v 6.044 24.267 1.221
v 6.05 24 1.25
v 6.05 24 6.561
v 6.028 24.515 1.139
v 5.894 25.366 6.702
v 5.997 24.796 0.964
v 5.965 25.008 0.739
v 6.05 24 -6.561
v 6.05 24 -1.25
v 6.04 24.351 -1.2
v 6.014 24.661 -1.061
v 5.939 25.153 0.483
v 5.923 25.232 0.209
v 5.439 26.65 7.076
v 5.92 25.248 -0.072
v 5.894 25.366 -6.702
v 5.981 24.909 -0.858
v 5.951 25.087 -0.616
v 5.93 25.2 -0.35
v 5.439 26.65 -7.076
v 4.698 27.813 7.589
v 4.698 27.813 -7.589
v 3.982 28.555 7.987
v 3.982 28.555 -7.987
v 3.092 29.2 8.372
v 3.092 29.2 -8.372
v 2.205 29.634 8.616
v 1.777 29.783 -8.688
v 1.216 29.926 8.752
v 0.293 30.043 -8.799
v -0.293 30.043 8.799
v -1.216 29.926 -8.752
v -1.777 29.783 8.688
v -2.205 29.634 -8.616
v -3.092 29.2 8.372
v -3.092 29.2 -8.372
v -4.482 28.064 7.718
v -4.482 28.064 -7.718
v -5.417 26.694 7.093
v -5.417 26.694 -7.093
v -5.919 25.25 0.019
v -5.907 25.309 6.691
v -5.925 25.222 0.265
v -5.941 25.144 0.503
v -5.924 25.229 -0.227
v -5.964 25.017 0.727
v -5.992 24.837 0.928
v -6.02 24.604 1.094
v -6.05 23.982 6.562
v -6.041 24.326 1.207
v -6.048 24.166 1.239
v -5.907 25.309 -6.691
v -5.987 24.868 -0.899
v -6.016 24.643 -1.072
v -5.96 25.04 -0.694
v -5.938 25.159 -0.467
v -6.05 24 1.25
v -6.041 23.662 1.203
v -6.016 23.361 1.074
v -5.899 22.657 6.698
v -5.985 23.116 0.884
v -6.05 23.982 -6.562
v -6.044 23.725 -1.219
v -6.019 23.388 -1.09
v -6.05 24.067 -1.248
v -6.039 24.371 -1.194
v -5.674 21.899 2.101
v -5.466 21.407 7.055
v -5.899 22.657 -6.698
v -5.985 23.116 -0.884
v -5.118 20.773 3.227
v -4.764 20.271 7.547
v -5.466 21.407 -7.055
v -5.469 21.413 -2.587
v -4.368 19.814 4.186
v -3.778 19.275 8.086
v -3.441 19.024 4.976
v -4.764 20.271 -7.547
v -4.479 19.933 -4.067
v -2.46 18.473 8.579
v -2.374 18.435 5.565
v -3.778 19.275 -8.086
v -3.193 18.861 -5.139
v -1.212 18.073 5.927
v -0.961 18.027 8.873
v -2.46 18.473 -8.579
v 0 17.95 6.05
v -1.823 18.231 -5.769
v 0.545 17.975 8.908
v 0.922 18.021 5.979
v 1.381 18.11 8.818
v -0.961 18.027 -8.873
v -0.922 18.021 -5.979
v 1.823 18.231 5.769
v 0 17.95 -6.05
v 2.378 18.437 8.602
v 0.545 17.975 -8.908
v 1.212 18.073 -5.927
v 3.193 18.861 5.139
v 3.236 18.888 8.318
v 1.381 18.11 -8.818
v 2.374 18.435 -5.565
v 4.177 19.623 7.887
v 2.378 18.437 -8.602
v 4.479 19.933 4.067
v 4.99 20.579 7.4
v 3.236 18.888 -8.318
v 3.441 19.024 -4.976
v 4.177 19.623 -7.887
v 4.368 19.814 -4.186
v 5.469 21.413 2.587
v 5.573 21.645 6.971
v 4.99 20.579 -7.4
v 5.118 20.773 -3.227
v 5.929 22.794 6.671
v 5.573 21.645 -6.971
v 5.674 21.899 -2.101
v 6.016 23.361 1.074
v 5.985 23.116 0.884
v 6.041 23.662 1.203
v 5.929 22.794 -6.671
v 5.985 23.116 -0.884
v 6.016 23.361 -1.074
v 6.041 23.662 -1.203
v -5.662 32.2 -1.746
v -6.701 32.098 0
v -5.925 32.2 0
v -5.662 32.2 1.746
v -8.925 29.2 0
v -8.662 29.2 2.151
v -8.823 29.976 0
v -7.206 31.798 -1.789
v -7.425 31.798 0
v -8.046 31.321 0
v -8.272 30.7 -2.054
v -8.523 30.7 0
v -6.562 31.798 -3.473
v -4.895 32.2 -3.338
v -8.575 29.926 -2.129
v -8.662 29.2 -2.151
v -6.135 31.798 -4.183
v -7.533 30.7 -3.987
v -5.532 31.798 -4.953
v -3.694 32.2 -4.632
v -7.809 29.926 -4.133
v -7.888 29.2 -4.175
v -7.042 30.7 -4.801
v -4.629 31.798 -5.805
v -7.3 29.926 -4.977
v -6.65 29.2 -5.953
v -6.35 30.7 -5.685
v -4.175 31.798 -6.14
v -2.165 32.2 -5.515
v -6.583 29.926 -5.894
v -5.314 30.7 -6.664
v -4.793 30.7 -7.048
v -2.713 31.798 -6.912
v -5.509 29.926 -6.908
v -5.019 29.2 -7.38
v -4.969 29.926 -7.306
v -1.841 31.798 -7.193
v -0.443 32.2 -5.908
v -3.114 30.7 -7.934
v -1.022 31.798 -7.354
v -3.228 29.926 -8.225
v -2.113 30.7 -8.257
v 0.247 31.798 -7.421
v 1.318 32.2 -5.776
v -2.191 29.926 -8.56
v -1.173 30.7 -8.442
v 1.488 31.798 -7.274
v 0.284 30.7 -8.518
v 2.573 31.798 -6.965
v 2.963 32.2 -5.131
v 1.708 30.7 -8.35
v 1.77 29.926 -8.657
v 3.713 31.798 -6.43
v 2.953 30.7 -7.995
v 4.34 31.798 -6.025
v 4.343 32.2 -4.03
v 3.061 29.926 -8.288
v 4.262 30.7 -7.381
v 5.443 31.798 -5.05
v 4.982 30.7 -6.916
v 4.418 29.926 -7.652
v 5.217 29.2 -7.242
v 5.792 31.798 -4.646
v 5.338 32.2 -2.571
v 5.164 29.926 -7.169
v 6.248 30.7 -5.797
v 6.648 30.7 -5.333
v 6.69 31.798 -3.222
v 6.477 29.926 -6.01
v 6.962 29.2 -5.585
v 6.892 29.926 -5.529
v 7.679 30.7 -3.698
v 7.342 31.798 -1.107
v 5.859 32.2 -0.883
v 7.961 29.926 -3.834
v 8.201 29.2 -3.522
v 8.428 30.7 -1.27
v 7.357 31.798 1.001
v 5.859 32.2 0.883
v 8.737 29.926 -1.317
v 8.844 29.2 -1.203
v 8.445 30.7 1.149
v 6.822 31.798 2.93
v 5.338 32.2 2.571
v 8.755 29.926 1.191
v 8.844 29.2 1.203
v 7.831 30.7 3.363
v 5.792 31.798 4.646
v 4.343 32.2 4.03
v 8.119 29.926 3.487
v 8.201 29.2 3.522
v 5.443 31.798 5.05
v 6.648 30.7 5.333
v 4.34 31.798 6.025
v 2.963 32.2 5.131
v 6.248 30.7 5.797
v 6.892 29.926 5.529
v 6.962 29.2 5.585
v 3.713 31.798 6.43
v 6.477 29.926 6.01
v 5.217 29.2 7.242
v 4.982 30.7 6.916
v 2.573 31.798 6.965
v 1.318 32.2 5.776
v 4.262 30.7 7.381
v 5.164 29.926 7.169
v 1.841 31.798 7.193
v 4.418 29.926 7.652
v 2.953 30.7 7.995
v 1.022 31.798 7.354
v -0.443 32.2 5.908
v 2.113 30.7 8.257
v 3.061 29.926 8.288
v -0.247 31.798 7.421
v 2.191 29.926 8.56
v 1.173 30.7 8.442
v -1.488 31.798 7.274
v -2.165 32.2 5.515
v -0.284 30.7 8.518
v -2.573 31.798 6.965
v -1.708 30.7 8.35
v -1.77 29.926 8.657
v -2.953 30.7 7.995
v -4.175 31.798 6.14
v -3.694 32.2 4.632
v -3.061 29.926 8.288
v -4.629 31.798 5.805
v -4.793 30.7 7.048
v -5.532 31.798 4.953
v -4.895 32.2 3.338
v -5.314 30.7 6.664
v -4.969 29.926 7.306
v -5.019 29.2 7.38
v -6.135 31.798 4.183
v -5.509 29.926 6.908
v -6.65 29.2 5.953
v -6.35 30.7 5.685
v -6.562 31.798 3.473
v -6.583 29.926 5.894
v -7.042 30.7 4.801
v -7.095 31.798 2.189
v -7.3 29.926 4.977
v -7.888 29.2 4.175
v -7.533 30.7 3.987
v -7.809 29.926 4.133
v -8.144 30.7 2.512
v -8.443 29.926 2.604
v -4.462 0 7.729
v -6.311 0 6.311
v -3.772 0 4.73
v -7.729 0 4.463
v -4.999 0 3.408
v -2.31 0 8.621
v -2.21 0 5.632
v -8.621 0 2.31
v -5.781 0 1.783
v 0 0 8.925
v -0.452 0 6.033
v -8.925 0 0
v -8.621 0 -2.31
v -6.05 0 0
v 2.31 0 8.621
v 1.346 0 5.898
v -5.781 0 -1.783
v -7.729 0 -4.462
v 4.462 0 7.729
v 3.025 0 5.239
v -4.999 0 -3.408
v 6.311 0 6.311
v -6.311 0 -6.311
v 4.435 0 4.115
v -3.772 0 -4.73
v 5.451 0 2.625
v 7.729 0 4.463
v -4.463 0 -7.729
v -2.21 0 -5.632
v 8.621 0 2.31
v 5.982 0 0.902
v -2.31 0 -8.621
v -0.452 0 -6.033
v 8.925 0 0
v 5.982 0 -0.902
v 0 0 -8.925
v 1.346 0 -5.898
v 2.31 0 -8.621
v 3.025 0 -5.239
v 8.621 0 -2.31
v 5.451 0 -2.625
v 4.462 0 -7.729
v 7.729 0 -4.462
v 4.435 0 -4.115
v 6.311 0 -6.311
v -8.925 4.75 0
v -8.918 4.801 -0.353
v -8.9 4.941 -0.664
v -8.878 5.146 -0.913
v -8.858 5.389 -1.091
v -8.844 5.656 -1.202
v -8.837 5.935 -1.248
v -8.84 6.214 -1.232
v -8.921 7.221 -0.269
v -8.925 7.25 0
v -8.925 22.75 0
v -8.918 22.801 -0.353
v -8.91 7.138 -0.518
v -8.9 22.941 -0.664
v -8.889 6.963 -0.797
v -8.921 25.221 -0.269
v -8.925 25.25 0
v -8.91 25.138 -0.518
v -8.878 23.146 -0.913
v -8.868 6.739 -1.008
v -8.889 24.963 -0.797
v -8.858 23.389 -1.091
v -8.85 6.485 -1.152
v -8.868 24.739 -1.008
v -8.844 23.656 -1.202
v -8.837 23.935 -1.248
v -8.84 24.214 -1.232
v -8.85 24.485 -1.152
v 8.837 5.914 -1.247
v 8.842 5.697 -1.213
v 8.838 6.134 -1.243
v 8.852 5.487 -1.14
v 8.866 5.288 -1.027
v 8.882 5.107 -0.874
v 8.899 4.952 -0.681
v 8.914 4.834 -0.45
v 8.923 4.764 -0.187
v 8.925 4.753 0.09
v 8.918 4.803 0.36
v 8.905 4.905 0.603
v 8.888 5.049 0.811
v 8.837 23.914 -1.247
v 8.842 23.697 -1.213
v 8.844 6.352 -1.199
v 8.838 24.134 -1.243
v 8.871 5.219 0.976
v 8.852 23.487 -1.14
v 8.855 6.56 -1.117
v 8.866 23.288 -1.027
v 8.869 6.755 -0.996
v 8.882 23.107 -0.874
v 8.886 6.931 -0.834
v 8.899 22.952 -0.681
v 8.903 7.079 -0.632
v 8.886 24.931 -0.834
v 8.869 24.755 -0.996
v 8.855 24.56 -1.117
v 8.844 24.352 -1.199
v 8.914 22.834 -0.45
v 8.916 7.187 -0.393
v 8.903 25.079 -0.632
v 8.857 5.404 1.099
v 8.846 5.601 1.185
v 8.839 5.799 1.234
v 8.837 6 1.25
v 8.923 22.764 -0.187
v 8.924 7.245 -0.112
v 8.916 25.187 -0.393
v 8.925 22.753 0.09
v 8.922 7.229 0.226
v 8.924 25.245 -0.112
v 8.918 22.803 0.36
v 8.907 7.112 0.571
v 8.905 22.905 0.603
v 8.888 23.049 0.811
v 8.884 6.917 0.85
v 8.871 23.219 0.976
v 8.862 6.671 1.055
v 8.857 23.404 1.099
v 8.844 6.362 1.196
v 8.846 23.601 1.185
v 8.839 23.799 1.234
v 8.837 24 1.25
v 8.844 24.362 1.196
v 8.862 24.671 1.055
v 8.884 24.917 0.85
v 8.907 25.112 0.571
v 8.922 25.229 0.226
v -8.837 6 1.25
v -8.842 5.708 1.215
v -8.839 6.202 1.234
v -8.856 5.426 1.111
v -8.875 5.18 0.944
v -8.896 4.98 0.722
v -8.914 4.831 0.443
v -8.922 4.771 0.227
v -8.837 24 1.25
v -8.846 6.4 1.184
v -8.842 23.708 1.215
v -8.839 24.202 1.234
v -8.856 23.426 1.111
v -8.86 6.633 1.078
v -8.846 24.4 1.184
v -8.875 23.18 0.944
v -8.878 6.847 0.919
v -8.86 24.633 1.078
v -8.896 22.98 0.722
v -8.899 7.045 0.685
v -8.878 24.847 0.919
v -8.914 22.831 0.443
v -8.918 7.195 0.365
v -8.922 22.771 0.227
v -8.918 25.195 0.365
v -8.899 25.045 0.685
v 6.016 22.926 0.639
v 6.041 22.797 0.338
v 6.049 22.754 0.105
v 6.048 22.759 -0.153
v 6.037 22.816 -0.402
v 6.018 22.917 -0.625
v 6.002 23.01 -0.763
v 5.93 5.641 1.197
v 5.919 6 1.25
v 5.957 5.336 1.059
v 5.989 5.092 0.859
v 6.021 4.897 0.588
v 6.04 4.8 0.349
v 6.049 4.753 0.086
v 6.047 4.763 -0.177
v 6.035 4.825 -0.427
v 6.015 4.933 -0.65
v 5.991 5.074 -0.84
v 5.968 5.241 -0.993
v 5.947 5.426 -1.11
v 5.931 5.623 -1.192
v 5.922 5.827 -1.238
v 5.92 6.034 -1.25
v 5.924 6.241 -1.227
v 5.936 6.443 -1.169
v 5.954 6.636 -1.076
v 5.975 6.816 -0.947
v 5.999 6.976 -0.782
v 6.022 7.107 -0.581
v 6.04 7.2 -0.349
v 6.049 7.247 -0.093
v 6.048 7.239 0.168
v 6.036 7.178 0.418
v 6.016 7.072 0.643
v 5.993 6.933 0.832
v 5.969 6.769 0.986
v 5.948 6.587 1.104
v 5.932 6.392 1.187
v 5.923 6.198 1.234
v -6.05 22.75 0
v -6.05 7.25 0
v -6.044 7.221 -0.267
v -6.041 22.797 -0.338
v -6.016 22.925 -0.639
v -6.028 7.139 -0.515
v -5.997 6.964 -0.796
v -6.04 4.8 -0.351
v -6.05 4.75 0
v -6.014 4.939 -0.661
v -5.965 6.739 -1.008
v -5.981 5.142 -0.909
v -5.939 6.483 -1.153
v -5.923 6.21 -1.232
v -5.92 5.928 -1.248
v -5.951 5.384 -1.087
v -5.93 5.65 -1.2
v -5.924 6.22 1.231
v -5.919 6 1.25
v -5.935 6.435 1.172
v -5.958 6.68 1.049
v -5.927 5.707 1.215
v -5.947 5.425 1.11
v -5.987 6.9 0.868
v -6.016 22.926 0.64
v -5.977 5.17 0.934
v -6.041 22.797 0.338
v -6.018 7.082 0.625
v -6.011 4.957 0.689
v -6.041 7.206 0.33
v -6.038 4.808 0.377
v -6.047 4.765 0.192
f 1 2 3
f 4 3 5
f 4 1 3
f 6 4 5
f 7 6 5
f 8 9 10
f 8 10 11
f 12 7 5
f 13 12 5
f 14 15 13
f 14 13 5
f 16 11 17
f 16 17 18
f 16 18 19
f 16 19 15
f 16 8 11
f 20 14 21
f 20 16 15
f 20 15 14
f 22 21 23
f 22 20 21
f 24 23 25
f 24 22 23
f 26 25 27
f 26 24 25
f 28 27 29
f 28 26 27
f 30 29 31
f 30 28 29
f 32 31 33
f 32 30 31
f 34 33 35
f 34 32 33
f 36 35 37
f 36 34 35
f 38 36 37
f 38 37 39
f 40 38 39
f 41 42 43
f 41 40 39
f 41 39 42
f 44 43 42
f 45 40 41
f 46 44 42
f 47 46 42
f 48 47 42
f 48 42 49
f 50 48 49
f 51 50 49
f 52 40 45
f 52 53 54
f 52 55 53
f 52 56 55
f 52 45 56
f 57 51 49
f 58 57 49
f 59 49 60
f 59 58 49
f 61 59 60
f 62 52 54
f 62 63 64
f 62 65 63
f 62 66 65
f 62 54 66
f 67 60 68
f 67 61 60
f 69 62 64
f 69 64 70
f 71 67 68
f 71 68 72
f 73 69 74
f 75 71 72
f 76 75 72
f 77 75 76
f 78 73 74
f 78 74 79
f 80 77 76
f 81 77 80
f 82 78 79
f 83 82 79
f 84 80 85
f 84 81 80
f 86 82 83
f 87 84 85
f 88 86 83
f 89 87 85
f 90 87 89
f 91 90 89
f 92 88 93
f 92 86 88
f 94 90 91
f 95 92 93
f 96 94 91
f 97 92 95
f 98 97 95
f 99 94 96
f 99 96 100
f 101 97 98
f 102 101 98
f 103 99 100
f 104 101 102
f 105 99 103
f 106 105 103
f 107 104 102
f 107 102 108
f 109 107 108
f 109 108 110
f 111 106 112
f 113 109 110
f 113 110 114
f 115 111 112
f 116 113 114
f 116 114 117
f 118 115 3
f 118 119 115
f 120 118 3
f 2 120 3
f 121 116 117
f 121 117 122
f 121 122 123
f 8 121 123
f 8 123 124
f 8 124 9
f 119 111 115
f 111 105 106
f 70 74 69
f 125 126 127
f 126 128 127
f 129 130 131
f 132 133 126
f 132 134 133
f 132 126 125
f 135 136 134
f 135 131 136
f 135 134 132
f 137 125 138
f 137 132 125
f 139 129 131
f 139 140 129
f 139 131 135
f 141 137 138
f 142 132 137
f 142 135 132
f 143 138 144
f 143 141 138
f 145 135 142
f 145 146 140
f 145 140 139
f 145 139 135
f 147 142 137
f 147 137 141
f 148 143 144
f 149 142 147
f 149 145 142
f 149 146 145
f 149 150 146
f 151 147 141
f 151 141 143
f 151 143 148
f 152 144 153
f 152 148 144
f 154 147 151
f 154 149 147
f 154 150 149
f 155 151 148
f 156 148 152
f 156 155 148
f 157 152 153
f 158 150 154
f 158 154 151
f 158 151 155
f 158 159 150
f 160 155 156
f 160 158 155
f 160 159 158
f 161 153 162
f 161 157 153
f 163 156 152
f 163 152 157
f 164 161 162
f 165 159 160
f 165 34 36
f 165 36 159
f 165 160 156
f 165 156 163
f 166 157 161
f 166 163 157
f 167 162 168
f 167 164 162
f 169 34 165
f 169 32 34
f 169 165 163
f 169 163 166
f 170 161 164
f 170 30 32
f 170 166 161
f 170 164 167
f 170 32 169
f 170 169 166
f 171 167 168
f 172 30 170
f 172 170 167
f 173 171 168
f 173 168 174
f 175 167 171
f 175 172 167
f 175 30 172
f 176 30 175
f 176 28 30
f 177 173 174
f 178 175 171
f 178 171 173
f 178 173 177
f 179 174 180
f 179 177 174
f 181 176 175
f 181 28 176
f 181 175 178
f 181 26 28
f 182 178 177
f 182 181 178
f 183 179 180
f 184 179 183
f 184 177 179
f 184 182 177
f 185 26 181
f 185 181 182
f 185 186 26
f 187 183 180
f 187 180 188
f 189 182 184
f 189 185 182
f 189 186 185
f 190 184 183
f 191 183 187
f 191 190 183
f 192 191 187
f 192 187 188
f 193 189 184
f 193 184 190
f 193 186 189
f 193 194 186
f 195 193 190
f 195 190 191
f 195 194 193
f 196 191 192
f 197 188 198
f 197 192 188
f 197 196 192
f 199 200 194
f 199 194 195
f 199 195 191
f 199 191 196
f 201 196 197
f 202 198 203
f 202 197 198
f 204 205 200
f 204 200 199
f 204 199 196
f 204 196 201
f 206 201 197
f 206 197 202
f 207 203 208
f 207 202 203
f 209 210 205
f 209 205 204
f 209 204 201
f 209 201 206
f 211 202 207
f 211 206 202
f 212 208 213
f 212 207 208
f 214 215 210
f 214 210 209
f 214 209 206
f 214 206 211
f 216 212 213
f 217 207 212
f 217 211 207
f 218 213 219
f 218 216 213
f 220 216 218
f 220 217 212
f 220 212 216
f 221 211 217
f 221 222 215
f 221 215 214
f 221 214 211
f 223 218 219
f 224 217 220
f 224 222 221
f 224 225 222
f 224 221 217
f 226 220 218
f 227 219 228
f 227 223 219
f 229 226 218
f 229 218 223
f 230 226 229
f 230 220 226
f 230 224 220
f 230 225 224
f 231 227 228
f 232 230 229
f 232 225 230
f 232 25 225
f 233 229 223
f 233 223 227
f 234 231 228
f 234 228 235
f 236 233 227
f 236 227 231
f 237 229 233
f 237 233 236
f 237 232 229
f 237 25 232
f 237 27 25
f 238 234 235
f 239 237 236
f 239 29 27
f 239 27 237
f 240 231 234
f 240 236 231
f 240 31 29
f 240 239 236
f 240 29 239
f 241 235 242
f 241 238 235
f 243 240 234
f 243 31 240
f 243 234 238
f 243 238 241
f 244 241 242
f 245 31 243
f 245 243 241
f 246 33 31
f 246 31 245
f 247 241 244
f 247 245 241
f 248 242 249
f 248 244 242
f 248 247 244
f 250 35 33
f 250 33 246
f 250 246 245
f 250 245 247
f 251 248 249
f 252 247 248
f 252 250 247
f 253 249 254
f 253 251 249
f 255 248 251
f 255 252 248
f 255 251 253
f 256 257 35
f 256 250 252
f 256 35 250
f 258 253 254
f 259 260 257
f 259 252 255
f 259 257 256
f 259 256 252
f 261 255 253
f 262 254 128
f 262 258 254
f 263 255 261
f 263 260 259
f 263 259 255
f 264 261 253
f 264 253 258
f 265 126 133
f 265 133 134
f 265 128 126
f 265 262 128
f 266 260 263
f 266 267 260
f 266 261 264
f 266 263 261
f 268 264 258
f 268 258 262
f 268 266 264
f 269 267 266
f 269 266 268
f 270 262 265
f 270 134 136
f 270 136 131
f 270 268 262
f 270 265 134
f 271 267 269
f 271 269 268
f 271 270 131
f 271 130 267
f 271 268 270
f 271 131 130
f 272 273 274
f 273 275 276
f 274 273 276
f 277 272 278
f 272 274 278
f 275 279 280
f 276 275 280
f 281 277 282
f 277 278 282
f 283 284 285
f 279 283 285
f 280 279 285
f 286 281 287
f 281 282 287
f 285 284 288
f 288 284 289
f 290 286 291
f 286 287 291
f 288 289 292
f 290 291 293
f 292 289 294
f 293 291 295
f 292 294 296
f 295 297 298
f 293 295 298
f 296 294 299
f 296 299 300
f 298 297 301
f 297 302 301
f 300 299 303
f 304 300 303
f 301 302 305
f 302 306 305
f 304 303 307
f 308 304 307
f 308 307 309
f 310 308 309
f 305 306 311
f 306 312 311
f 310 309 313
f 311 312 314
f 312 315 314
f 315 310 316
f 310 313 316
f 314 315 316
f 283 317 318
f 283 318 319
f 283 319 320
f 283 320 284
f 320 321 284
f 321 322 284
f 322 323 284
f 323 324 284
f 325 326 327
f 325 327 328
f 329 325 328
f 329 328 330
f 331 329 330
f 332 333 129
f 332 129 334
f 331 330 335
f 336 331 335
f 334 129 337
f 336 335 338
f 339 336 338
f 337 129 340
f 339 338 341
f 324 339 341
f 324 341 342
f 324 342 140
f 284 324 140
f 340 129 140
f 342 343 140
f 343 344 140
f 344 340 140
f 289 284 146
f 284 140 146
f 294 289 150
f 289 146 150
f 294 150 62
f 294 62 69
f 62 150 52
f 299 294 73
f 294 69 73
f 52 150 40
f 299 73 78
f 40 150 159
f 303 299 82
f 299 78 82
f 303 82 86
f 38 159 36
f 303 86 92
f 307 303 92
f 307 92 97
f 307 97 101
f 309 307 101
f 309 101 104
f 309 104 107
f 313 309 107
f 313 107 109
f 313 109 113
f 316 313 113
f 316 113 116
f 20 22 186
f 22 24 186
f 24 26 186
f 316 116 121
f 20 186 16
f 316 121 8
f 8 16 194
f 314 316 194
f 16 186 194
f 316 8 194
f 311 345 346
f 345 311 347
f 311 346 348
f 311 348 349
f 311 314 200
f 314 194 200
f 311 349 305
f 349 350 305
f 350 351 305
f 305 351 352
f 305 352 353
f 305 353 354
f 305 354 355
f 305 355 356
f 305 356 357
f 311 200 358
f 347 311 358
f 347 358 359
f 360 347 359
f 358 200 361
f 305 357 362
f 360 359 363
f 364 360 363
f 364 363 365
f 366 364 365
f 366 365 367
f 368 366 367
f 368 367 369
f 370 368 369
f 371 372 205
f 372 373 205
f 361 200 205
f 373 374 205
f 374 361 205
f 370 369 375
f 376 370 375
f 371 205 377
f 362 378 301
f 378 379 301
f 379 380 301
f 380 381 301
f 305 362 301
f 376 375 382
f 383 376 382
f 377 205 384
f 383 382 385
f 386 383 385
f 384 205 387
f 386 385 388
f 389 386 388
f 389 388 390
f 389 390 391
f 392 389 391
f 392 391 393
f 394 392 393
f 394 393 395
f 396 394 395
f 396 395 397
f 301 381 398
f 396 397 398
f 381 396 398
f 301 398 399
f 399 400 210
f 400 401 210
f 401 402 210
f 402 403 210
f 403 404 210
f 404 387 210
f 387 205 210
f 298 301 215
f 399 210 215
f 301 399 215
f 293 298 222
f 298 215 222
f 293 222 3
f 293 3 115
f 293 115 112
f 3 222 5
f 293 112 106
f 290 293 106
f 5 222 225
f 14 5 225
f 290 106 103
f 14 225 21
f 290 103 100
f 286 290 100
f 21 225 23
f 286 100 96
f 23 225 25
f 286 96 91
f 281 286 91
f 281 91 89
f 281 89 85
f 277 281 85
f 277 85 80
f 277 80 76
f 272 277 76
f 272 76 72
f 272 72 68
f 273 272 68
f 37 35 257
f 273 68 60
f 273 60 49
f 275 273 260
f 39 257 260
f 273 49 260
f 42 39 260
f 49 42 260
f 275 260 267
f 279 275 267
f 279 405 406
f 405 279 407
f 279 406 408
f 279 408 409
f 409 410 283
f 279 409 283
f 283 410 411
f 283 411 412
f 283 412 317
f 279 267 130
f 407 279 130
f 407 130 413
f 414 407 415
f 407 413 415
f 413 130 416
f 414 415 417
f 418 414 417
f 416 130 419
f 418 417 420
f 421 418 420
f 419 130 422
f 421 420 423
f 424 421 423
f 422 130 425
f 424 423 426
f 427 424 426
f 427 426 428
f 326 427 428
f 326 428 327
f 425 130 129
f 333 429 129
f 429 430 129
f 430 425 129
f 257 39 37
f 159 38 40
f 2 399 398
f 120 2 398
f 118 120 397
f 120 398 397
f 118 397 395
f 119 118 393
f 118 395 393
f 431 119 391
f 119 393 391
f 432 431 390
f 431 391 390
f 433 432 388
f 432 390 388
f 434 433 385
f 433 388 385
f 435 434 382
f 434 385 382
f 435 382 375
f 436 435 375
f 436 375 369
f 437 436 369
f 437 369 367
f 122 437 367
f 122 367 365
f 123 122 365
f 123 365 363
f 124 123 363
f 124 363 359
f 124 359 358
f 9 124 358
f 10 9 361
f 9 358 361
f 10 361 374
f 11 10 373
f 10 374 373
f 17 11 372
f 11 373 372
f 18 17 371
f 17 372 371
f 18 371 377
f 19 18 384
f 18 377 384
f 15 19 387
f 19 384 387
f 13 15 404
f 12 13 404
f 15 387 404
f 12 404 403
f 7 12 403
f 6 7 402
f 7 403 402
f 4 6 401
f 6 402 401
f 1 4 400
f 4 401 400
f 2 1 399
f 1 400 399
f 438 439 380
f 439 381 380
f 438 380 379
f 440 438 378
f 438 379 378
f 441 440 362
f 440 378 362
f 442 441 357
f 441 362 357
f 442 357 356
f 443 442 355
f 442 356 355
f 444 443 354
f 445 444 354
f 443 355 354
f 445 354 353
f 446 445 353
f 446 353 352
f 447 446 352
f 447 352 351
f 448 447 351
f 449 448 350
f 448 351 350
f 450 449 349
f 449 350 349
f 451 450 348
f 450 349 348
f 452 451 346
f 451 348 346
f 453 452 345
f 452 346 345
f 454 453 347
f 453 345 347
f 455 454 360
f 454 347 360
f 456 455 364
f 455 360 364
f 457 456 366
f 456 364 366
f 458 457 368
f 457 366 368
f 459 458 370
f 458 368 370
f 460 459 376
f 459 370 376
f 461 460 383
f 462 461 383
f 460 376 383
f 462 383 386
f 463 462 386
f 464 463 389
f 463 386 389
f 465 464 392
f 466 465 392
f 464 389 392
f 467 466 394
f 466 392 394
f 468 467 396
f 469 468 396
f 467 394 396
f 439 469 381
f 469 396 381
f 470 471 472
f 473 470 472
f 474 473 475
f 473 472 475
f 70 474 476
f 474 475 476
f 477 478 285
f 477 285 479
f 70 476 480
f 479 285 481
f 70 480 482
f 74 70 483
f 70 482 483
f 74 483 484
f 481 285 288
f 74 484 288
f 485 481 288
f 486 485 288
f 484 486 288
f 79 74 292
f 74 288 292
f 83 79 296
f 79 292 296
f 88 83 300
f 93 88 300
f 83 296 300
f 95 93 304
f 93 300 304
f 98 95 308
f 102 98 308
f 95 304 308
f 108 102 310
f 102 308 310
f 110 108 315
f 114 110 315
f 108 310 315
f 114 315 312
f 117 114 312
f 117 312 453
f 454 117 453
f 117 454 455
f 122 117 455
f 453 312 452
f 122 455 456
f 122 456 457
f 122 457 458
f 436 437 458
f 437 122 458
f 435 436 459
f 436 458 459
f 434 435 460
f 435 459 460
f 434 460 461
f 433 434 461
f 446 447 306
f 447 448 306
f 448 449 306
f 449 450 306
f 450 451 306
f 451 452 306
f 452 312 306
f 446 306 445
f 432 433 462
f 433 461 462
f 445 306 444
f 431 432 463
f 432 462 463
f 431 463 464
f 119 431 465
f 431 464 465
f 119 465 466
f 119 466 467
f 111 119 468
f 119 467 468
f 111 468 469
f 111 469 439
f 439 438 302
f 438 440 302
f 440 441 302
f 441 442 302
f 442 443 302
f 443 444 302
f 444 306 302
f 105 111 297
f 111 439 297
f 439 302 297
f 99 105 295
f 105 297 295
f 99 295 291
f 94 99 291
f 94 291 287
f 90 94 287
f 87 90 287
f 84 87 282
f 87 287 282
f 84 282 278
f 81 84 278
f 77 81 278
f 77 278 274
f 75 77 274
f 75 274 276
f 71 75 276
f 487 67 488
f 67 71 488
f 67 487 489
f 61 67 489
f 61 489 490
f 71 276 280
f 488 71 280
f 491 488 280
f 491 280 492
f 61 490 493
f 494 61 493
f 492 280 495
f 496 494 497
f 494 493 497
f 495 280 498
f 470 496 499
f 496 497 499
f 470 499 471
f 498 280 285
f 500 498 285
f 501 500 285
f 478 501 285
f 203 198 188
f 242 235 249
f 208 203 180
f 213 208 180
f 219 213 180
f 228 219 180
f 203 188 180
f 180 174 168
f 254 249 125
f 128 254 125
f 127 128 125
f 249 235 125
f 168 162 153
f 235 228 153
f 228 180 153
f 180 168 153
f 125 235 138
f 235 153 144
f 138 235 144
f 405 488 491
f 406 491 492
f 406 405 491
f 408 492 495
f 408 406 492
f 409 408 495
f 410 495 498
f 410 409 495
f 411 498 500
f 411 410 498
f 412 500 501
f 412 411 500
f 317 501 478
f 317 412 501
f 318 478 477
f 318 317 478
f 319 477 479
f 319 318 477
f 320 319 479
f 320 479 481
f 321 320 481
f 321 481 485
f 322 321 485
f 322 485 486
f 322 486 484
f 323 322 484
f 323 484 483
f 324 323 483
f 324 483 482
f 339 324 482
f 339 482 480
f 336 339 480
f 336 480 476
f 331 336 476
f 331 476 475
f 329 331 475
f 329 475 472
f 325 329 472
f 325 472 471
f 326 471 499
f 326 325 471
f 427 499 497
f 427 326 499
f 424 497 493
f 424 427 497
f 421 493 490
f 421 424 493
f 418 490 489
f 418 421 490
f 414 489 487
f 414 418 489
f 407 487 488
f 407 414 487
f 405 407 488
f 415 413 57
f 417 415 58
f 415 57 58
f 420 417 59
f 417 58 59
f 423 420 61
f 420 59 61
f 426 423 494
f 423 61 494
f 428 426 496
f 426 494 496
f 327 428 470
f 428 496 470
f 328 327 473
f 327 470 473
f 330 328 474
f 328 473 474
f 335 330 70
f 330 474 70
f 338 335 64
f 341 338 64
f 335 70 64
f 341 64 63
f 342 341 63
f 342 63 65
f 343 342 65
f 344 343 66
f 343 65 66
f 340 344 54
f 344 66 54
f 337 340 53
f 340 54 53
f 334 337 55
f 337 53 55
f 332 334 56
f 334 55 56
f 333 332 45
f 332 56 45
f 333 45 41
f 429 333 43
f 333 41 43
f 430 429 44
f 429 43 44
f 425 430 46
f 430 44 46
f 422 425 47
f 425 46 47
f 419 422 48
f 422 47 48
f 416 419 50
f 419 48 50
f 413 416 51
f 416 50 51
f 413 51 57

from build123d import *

# Parameters (mm, degrees)
CUT_EXTRUDE_1_DEPTH         = 35.585419616
CUT_EXTRUDE_1_DEPTH_BACK    = 35.585419616
SKETCH_2_R                  = 6.05
SKETCH_4_W                  = 1.25
SKETCH_4_H                  = 8.925
HOLE_WIZARD_M3_1_AT_2_COUNT = 2
HOLE_WIZARD_M3_1_AT_2_PITCH = 18
MIRROR_1_COPY_1_SKETCH_W    = 1.25
MIRROR_1_COPY_1_SKETCH_H    = 8.925
FILLET_1_R                  = 3


with BuildPart() as part:
    # 草图1 → 旋转1 (revolve)
    with BuildSketch(Plane.XY, mode=Mode.PRIVATE) as revolve_1_sk:
        with BuildLine():
            Line((6.05, 0), (8.925, 0))
            Line((8.925, 0), (8.925, 32.2))
            Line((8.925, 32.2), (0, 32.2))
            Line((0, 32.2), (0, 30.05))
            ThreePointArc((0, 30.05), (4.277996026, 28.277996026), (6.05, 24))
            Line((6.05, 24), (6.05, 0))
        make_face()
    revolve(revolve_1_sk.sketch.rotate(Axis((0, 32.2, 0), (0, -1, 0)), 180), axis=Axis((0, 32.2, 0), (0, -1, 0)))

    # 草图2 → 切除-拉伸1 (cut, two sides: drawn at the far end of the back side and taken through both)
    with BuildSketch(Plane.XY.offset(-CUT_EXTRUDE_1_DEPTH_BACK)):
        with Locations((0, 24)):
            Circle(SKETCH_2_R)
    extrude(amount=CUT_EXTRUDE_1_DEPTH + CUT_EXTRUDE_1_DEPTH_BACK, mode=Mode.SUBTRACT)

    # 草图4 → M3 螺纹孔1 (revolve, cut)
    with BuildSketch(Plane.ZX.offset(6)):
        with Locations((0.625, 4.4625)):
            Rectangle(SKETCH_4_W, SKETCH_4_H)
    hole_wizard_m3_1 = revolve(axis=Axis((-6.35, 6, 0), (1, 0, 0)), mode=Mode.SUBTRACT)

    # M3 螺纹孔1 at 2: M3 螺纹孔1 ×2
    with Locations(*[(0, i * HOLE_WIZARD_M3_1_AT_2_PITCH, 0) for i in range(1, HOLE_WIZARD_M3_1_AT_2_COUNT)]):
        add(hole_wizard_m3_1, mode=Mode.SUBTRACT)

    # 镜向1: M3 螺纹孔1 across plane
    add(hole_wizard_m3_1.mirror(Plane(origin=(0, 0, 0), x_dir=(0, 0, 1), z_dir=(1, 0, 0))), mode=Mode.SUBTRACT)

    # 镜向1 copy 1 sketch → 镜向1 copy 1 (revolve, cut)
    with BuildSketch(Plane.ZX.offset(24)):
        with Locations((0.625, -4.4625)):
            Rectangle(MIRROR_1_COPY_1_SKETCH_W, MIRROR_1_COPY_1_SKETCH_H)
    revolve(axis=Axis((6.35, 24, 0), (1, 0, 0)), mode=Mode.SUBTRACT)

    # 圆角1
    # the kernel refuses this fillet: 3 mm, written as the material it takes off along each edge
    with BuildSketch(Plane(origin=(0, 32.2, 0), x_dir=(-1, 0, 0), z_dir=(0, 0, 1))) as fillet_1_piece_1:
        with BuildLine():
            CenterArc((8.925 - FILLET_1_R, FILLET_1_R), FILLET_1_R, 270, 90)
            Line((8.925 - FILLET_1_R, 0), (8.925, 0))
            Line((8.925, 0), (8.925, FILLET_1_R))
        make_face()
    revolve(axis=Axis((0, 32.2, 0), (0, -1, 0)), mode=Mode.SUBTRACT)


solid = part.part
